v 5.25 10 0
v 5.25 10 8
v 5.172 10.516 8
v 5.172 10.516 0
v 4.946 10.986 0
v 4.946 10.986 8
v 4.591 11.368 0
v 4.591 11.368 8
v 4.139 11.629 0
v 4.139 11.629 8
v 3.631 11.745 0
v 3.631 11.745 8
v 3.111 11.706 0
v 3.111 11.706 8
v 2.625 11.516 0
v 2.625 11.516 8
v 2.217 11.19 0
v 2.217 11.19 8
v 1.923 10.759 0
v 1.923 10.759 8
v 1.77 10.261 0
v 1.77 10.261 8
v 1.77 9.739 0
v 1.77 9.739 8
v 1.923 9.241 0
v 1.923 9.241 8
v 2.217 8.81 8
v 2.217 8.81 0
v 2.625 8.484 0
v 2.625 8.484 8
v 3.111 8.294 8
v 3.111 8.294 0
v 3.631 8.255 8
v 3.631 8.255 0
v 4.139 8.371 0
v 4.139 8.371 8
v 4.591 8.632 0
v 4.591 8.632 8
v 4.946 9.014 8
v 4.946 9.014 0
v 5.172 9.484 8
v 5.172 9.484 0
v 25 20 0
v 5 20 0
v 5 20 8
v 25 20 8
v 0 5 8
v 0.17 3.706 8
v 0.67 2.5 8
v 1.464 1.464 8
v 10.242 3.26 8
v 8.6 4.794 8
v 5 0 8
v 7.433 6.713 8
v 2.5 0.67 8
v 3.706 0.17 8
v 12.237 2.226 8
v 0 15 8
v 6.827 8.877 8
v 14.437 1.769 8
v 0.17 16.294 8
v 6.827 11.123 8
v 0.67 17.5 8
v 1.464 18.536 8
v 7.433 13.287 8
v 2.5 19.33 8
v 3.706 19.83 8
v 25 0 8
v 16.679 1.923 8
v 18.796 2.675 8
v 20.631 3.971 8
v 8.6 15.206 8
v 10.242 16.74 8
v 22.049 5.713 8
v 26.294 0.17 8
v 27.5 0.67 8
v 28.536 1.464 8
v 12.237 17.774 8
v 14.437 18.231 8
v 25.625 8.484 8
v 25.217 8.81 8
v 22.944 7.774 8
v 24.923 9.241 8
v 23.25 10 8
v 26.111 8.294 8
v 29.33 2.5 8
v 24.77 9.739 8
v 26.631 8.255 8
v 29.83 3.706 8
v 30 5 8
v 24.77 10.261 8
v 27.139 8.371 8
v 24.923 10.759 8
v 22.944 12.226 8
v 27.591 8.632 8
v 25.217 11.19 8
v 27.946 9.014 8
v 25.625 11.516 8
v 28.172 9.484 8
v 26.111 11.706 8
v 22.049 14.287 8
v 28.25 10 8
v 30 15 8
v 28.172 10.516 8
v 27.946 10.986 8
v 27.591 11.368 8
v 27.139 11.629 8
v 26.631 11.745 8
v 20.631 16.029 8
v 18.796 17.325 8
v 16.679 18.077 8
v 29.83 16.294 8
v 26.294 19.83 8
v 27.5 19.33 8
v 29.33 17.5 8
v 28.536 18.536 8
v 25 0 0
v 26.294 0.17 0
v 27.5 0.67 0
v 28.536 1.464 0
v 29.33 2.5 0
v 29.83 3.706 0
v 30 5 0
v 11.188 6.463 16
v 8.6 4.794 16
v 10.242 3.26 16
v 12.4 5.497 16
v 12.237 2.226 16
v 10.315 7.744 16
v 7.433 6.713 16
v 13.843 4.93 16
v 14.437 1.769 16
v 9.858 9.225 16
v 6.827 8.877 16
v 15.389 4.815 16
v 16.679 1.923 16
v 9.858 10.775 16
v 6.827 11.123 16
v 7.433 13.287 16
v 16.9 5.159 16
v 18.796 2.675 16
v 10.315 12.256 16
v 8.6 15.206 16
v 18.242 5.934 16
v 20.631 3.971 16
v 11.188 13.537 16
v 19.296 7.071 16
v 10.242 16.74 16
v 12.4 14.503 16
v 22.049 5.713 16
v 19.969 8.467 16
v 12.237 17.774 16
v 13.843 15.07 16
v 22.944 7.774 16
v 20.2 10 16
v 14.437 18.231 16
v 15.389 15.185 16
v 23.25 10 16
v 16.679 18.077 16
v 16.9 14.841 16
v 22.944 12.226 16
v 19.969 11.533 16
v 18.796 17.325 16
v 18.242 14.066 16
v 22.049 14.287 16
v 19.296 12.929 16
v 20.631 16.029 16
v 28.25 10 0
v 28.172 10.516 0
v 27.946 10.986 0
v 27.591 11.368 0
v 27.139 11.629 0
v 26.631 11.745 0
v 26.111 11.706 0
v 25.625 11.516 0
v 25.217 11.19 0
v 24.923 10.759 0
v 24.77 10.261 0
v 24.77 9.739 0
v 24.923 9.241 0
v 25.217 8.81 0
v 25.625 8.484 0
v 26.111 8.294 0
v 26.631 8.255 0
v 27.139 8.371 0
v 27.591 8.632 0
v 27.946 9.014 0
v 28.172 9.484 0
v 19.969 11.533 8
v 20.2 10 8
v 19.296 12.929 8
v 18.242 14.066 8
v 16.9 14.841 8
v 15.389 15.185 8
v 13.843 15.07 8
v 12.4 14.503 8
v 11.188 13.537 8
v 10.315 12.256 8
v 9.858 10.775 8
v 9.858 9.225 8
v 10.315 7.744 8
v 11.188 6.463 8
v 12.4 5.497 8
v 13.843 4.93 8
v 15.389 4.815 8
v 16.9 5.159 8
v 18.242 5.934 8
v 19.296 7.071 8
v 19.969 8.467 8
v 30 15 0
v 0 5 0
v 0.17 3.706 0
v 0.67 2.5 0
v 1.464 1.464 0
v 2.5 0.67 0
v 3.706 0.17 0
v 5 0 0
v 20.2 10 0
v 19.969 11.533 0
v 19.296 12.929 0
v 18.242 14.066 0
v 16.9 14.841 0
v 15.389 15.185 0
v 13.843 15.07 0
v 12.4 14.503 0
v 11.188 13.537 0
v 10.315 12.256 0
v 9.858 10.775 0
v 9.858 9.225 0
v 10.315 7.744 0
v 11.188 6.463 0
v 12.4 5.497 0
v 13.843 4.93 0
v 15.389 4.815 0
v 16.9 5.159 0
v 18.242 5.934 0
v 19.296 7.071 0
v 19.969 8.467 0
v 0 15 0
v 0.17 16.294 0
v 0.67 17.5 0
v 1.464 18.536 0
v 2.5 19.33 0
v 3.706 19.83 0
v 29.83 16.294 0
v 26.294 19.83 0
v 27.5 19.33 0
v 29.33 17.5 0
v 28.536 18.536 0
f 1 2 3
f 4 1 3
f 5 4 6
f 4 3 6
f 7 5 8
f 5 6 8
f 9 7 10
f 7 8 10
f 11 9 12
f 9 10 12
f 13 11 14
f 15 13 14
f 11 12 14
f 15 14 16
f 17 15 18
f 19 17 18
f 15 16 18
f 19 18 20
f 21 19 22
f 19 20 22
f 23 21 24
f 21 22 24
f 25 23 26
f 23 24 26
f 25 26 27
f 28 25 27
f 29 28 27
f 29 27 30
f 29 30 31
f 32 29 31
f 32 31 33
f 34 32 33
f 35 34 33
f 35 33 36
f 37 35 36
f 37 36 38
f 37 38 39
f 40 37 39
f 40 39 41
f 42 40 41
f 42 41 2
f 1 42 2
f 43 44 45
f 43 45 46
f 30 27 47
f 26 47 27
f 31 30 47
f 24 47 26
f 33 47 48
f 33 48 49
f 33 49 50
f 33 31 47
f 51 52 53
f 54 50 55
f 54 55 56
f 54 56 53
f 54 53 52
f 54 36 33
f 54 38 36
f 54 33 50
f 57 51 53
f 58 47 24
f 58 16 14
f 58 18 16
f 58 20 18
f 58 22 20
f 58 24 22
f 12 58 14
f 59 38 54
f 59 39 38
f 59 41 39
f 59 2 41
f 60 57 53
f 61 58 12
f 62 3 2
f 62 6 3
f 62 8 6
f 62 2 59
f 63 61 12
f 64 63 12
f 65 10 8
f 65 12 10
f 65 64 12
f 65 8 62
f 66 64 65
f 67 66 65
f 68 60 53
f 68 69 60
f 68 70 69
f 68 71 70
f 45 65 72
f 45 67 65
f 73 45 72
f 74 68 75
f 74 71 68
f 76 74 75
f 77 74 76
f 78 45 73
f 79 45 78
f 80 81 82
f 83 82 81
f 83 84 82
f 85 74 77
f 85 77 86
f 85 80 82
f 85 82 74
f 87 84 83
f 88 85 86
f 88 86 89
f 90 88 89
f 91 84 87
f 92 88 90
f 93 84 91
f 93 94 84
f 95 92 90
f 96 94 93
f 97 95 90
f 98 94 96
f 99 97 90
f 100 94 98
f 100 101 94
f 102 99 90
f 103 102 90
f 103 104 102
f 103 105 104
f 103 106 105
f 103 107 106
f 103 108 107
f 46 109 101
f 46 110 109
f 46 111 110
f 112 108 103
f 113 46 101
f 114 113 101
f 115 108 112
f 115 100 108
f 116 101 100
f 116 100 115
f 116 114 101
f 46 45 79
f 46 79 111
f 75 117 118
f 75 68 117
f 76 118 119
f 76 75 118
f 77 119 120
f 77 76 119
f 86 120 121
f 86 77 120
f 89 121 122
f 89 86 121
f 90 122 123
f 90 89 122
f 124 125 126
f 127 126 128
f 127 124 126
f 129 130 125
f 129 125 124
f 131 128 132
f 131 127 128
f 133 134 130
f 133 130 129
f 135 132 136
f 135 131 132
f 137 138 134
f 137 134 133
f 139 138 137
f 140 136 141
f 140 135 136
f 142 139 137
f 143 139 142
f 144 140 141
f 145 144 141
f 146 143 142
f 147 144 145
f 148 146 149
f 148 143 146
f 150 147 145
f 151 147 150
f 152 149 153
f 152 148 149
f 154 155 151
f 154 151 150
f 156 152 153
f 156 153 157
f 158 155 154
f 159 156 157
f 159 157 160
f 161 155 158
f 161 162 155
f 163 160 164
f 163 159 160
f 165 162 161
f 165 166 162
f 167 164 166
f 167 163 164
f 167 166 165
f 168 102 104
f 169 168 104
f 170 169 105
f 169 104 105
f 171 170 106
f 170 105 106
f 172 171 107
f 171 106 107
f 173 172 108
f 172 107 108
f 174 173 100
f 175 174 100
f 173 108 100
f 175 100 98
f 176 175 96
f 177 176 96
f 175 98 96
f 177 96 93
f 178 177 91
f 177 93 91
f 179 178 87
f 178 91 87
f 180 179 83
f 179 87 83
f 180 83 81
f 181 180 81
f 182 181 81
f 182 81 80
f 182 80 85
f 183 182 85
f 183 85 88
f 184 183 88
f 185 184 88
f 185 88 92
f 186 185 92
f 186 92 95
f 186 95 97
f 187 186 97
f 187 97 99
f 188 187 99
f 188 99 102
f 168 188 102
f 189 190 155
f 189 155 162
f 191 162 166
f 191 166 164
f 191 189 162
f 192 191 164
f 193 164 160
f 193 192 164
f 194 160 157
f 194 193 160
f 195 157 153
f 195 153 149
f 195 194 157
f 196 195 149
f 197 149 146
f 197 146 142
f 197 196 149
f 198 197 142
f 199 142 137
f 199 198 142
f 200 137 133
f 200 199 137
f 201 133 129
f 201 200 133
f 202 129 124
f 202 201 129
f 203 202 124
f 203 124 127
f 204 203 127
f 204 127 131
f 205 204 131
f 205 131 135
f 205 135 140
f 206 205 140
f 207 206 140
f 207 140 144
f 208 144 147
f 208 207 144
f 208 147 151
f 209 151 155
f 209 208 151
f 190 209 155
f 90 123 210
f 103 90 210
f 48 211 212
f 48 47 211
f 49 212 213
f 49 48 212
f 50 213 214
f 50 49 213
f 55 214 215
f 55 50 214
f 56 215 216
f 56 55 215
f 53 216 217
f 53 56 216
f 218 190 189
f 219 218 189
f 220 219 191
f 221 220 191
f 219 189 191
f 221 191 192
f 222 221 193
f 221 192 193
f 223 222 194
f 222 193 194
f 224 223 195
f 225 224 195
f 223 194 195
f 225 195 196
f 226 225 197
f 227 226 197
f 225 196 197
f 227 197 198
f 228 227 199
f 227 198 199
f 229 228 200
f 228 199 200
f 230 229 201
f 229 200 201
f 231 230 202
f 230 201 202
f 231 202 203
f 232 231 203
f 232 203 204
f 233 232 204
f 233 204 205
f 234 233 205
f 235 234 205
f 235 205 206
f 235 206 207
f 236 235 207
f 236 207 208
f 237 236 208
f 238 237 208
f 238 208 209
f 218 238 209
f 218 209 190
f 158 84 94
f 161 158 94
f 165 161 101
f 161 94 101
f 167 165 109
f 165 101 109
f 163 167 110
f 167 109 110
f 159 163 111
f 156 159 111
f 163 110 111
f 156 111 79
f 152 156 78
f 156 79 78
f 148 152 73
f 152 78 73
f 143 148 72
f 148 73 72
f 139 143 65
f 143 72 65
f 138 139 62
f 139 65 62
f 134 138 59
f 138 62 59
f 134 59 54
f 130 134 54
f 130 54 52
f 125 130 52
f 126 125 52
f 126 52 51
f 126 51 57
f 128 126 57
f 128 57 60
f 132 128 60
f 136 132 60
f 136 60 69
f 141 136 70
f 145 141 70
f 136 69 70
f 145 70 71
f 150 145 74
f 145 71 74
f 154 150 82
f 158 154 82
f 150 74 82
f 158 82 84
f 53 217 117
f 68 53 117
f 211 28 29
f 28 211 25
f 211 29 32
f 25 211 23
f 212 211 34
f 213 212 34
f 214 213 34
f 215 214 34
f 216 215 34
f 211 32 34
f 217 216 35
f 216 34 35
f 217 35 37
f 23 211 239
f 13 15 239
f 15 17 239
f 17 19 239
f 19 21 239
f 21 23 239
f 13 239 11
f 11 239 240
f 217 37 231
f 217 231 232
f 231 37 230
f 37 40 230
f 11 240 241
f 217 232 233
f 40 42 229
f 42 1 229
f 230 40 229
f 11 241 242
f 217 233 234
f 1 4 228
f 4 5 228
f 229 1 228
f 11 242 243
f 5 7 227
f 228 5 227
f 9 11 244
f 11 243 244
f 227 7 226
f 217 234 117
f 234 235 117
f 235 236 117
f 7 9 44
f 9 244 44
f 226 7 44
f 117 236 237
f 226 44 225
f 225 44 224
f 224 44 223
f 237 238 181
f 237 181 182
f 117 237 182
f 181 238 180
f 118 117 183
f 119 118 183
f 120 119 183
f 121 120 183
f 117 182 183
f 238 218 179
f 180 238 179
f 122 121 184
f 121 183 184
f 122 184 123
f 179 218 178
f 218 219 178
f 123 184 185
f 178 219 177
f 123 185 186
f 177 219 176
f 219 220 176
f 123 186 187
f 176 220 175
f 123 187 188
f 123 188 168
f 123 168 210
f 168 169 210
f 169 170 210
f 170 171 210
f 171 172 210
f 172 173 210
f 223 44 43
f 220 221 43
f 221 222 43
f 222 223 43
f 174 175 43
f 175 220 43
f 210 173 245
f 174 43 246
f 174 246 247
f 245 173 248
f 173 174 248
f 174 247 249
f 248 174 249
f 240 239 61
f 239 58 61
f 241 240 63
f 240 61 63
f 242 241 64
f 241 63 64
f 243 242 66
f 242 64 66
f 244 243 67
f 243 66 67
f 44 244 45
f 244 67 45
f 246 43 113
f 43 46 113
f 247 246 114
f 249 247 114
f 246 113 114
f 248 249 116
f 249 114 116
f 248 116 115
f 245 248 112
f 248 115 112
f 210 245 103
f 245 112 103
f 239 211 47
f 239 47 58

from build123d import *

# Parameters (mm, degrees)
F0_W     = 30
F0_H     = 20
F1_DEPTH = 8
F2_R     = 8.25
F2_R_2   = 5.2
F3_DEPTH = 8
F4_R     = 1.75
F4_R_2   = 5.2
F5_DEPTH = 25
F6_R     = 5


with BuildPart() as f1:
    # F0 (on Top) → F1 (new body)
    with BuildSketch(Plane.XY):
        with Locations((15, 10)):
            Rectangle(F0_W, F0_H)
    extrude(amount=F1_DEPTH)

    # F2 (on face) → F3 (join)
    with BuildSketch(Plane.XY.offset(8)):
        with Locations((15, 10)):
            Circle(F2_R)
        with Locations((15, 10)):
            Circle(F2_R_2, mode=Mode.SUBTRACT)
    extrude(amount=F3_DEPTH)

    # F4 (on face) → F5 (cut)
    with BuildSketch(Plane.XY.offset(8)):
        with Locations((3.5, 10)):
            Circle(F4_R)
        with Locations((26.5, 10)):
            Circle(F4_R)
        with Locations((15, 10)):
            Circle(F4_R_2)
    extrude(amount=-F5_DEPTH, mode=Mode.SUBTRACT)

    # F6
    f6_edges = [f1.edges().sort_by_distance(p)[0] for p in [
        (0, 0, 4),
        (30, 0, 4),
        (30, 20, 4),
        (0, 20, 4),
    ]]
    fillet(f6_edges, radius=F6_R)


solid = f1.part
